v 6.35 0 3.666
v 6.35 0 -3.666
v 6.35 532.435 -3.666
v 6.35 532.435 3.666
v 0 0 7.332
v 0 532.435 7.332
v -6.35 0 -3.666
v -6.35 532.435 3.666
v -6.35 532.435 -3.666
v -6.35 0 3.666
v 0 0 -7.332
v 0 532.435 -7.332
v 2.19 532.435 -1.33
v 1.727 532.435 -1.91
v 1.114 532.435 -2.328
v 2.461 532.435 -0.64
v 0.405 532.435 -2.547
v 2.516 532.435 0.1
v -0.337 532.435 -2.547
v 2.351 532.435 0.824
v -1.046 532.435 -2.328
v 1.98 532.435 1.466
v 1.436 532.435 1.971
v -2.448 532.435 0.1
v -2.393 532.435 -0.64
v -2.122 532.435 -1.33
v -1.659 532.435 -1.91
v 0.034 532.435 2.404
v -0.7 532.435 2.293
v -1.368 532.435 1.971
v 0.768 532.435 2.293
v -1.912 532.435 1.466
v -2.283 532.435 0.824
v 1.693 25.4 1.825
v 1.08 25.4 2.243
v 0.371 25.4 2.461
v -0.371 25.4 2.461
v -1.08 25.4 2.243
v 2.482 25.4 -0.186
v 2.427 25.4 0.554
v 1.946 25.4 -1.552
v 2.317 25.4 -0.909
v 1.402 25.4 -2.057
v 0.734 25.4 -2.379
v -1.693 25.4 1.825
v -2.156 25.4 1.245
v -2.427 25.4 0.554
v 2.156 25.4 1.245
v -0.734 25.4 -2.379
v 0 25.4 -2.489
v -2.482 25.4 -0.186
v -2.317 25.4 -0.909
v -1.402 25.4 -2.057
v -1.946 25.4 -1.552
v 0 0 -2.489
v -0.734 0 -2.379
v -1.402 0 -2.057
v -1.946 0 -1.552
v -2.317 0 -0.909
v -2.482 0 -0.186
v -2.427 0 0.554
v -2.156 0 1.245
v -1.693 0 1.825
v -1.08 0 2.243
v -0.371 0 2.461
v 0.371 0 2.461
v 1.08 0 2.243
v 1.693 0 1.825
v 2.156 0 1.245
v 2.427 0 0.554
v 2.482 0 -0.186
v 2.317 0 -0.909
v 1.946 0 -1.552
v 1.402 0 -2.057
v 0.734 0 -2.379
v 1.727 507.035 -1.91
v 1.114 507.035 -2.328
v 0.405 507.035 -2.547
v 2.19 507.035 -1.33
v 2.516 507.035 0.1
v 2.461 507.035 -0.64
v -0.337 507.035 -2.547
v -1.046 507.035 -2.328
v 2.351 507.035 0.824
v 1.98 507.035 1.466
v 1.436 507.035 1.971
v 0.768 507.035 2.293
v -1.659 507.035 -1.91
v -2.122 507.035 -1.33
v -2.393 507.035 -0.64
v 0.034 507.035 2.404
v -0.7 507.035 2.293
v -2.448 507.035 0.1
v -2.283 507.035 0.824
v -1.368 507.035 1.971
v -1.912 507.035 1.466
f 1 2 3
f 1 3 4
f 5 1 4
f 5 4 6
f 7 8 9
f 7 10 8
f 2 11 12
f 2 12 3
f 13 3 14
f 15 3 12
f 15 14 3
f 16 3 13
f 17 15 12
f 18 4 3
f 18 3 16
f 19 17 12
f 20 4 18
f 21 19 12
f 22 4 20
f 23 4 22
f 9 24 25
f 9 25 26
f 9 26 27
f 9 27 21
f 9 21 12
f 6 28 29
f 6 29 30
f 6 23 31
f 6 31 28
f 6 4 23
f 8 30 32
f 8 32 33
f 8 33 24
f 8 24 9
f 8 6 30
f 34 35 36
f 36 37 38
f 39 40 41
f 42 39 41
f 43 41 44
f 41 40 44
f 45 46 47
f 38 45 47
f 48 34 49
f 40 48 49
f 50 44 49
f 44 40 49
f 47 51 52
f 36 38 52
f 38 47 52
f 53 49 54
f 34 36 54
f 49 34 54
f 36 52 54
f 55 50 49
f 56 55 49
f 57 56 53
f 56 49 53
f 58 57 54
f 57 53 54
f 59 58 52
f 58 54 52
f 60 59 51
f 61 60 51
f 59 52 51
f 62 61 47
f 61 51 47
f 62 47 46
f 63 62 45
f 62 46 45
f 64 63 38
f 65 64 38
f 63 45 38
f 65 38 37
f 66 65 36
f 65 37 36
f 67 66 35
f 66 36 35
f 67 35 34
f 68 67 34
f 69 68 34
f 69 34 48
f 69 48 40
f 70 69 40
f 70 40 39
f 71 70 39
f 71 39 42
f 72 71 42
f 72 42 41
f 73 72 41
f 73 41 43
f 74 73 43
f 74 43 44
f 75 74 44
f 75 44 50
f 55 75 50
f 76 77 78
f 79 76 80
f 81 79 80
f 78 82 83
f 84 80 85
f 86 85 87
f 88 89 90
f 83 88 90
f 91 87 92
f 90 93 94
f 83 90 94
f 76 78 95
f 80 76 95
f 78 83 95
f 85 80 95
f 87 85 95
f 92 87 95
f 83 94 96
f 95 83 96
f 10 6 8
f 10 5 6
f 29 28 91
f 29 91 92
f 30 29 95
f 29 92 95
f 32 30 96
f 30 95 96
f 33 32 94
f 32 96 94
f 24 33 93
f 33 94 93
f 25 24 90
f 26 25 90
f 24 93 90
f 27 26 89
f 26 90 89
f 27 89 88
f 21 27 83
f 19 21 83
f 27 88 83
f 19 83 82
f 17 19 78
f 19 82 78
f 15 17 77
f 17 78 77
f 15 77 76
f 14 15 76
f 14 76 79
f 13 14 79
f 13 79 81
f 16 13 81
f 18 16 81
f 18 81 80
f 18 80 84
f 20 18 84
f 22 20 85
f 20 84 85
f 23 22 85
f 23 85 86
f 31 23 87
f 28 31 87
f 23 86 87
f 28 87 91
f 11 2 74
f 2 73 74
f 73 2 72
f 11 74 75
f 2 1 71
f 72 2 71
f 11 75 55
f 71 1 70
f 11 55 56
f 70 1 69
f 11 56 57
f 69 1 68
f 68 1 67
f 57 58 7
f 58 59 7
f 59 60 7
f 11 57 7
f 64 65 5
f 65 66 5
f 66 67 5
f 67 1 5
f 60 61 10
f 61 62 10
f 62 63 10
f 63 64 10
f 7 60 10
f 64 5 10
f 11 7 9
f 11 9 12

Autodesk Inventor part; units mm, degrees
ref_plane "YZ Plane" through (0, 0, 0) normal (1, 0, 0) x (0, 1, 0)
ref_plane "XZ Plane" through (0, 0, 0) normal (0, 1, 0) x (-1, 0, 0)
ref_plane "XY Plane" through (0, 0, 0) normal (0, 0, 1) x (1, 0, 0)
sketch "Sketch1" plane through (0, 0, 0) normal (0, 1, 0) x (-1, 0, 0)
  line L0 (6.35, -3.6662) -> (0, -7.3323)
  line L1 (0, -7.3323) -> (-6.35, -3.6662)
  line L2 (-6.35, -3.6662) -> (-6.35, 3.6662)
  line L3 (-6.35, 3.6662) -> (0, 7.3323)
  line L4 (0, 7.3323) -> (6.35, 3.6662)
  line L5 (6.35, 3.6662) -> (6.35, -3.6662)
  point P0 (0, 0)
  point P1 (0, 0)
  point P2 (0, 0)
  dimension "d0" = 12.7
extrude "Extrusion1" add sketch "Sketch1" along normal blind 532.4348
sketch "Sketch2" plane through (0, 0, 0) normal (0, -1, 0) x (1, 0, 0)
  point P0 (0, 0)
  point P1 (0, 0)
hole "Hole1" at (0, 0, 0) direction (0, 1, 0) diameter 4.9784 depth 25.4 thread size "1/4-20 UNC" class "2B" standard "ANSI Unified Screw Threads"
sketch "Sketch3" plane through (0, 532.4348, 0) normal (0, 1, 0) x (1, 0, 0)
  point P0 (0, 0)
  point P1 (0.0338, 0.0857)
hole "Hole2" at (0.0338, 532.4348, -0.0857) direction (0, -1, 0) diameter 4.9784 depth 25.4 thread size "1/4-20 UNC" class "2B" standard "ANSI Unified Screw Threads"
properties part number "INTK_003_HexShaft5" material "Aluminum 7075"
